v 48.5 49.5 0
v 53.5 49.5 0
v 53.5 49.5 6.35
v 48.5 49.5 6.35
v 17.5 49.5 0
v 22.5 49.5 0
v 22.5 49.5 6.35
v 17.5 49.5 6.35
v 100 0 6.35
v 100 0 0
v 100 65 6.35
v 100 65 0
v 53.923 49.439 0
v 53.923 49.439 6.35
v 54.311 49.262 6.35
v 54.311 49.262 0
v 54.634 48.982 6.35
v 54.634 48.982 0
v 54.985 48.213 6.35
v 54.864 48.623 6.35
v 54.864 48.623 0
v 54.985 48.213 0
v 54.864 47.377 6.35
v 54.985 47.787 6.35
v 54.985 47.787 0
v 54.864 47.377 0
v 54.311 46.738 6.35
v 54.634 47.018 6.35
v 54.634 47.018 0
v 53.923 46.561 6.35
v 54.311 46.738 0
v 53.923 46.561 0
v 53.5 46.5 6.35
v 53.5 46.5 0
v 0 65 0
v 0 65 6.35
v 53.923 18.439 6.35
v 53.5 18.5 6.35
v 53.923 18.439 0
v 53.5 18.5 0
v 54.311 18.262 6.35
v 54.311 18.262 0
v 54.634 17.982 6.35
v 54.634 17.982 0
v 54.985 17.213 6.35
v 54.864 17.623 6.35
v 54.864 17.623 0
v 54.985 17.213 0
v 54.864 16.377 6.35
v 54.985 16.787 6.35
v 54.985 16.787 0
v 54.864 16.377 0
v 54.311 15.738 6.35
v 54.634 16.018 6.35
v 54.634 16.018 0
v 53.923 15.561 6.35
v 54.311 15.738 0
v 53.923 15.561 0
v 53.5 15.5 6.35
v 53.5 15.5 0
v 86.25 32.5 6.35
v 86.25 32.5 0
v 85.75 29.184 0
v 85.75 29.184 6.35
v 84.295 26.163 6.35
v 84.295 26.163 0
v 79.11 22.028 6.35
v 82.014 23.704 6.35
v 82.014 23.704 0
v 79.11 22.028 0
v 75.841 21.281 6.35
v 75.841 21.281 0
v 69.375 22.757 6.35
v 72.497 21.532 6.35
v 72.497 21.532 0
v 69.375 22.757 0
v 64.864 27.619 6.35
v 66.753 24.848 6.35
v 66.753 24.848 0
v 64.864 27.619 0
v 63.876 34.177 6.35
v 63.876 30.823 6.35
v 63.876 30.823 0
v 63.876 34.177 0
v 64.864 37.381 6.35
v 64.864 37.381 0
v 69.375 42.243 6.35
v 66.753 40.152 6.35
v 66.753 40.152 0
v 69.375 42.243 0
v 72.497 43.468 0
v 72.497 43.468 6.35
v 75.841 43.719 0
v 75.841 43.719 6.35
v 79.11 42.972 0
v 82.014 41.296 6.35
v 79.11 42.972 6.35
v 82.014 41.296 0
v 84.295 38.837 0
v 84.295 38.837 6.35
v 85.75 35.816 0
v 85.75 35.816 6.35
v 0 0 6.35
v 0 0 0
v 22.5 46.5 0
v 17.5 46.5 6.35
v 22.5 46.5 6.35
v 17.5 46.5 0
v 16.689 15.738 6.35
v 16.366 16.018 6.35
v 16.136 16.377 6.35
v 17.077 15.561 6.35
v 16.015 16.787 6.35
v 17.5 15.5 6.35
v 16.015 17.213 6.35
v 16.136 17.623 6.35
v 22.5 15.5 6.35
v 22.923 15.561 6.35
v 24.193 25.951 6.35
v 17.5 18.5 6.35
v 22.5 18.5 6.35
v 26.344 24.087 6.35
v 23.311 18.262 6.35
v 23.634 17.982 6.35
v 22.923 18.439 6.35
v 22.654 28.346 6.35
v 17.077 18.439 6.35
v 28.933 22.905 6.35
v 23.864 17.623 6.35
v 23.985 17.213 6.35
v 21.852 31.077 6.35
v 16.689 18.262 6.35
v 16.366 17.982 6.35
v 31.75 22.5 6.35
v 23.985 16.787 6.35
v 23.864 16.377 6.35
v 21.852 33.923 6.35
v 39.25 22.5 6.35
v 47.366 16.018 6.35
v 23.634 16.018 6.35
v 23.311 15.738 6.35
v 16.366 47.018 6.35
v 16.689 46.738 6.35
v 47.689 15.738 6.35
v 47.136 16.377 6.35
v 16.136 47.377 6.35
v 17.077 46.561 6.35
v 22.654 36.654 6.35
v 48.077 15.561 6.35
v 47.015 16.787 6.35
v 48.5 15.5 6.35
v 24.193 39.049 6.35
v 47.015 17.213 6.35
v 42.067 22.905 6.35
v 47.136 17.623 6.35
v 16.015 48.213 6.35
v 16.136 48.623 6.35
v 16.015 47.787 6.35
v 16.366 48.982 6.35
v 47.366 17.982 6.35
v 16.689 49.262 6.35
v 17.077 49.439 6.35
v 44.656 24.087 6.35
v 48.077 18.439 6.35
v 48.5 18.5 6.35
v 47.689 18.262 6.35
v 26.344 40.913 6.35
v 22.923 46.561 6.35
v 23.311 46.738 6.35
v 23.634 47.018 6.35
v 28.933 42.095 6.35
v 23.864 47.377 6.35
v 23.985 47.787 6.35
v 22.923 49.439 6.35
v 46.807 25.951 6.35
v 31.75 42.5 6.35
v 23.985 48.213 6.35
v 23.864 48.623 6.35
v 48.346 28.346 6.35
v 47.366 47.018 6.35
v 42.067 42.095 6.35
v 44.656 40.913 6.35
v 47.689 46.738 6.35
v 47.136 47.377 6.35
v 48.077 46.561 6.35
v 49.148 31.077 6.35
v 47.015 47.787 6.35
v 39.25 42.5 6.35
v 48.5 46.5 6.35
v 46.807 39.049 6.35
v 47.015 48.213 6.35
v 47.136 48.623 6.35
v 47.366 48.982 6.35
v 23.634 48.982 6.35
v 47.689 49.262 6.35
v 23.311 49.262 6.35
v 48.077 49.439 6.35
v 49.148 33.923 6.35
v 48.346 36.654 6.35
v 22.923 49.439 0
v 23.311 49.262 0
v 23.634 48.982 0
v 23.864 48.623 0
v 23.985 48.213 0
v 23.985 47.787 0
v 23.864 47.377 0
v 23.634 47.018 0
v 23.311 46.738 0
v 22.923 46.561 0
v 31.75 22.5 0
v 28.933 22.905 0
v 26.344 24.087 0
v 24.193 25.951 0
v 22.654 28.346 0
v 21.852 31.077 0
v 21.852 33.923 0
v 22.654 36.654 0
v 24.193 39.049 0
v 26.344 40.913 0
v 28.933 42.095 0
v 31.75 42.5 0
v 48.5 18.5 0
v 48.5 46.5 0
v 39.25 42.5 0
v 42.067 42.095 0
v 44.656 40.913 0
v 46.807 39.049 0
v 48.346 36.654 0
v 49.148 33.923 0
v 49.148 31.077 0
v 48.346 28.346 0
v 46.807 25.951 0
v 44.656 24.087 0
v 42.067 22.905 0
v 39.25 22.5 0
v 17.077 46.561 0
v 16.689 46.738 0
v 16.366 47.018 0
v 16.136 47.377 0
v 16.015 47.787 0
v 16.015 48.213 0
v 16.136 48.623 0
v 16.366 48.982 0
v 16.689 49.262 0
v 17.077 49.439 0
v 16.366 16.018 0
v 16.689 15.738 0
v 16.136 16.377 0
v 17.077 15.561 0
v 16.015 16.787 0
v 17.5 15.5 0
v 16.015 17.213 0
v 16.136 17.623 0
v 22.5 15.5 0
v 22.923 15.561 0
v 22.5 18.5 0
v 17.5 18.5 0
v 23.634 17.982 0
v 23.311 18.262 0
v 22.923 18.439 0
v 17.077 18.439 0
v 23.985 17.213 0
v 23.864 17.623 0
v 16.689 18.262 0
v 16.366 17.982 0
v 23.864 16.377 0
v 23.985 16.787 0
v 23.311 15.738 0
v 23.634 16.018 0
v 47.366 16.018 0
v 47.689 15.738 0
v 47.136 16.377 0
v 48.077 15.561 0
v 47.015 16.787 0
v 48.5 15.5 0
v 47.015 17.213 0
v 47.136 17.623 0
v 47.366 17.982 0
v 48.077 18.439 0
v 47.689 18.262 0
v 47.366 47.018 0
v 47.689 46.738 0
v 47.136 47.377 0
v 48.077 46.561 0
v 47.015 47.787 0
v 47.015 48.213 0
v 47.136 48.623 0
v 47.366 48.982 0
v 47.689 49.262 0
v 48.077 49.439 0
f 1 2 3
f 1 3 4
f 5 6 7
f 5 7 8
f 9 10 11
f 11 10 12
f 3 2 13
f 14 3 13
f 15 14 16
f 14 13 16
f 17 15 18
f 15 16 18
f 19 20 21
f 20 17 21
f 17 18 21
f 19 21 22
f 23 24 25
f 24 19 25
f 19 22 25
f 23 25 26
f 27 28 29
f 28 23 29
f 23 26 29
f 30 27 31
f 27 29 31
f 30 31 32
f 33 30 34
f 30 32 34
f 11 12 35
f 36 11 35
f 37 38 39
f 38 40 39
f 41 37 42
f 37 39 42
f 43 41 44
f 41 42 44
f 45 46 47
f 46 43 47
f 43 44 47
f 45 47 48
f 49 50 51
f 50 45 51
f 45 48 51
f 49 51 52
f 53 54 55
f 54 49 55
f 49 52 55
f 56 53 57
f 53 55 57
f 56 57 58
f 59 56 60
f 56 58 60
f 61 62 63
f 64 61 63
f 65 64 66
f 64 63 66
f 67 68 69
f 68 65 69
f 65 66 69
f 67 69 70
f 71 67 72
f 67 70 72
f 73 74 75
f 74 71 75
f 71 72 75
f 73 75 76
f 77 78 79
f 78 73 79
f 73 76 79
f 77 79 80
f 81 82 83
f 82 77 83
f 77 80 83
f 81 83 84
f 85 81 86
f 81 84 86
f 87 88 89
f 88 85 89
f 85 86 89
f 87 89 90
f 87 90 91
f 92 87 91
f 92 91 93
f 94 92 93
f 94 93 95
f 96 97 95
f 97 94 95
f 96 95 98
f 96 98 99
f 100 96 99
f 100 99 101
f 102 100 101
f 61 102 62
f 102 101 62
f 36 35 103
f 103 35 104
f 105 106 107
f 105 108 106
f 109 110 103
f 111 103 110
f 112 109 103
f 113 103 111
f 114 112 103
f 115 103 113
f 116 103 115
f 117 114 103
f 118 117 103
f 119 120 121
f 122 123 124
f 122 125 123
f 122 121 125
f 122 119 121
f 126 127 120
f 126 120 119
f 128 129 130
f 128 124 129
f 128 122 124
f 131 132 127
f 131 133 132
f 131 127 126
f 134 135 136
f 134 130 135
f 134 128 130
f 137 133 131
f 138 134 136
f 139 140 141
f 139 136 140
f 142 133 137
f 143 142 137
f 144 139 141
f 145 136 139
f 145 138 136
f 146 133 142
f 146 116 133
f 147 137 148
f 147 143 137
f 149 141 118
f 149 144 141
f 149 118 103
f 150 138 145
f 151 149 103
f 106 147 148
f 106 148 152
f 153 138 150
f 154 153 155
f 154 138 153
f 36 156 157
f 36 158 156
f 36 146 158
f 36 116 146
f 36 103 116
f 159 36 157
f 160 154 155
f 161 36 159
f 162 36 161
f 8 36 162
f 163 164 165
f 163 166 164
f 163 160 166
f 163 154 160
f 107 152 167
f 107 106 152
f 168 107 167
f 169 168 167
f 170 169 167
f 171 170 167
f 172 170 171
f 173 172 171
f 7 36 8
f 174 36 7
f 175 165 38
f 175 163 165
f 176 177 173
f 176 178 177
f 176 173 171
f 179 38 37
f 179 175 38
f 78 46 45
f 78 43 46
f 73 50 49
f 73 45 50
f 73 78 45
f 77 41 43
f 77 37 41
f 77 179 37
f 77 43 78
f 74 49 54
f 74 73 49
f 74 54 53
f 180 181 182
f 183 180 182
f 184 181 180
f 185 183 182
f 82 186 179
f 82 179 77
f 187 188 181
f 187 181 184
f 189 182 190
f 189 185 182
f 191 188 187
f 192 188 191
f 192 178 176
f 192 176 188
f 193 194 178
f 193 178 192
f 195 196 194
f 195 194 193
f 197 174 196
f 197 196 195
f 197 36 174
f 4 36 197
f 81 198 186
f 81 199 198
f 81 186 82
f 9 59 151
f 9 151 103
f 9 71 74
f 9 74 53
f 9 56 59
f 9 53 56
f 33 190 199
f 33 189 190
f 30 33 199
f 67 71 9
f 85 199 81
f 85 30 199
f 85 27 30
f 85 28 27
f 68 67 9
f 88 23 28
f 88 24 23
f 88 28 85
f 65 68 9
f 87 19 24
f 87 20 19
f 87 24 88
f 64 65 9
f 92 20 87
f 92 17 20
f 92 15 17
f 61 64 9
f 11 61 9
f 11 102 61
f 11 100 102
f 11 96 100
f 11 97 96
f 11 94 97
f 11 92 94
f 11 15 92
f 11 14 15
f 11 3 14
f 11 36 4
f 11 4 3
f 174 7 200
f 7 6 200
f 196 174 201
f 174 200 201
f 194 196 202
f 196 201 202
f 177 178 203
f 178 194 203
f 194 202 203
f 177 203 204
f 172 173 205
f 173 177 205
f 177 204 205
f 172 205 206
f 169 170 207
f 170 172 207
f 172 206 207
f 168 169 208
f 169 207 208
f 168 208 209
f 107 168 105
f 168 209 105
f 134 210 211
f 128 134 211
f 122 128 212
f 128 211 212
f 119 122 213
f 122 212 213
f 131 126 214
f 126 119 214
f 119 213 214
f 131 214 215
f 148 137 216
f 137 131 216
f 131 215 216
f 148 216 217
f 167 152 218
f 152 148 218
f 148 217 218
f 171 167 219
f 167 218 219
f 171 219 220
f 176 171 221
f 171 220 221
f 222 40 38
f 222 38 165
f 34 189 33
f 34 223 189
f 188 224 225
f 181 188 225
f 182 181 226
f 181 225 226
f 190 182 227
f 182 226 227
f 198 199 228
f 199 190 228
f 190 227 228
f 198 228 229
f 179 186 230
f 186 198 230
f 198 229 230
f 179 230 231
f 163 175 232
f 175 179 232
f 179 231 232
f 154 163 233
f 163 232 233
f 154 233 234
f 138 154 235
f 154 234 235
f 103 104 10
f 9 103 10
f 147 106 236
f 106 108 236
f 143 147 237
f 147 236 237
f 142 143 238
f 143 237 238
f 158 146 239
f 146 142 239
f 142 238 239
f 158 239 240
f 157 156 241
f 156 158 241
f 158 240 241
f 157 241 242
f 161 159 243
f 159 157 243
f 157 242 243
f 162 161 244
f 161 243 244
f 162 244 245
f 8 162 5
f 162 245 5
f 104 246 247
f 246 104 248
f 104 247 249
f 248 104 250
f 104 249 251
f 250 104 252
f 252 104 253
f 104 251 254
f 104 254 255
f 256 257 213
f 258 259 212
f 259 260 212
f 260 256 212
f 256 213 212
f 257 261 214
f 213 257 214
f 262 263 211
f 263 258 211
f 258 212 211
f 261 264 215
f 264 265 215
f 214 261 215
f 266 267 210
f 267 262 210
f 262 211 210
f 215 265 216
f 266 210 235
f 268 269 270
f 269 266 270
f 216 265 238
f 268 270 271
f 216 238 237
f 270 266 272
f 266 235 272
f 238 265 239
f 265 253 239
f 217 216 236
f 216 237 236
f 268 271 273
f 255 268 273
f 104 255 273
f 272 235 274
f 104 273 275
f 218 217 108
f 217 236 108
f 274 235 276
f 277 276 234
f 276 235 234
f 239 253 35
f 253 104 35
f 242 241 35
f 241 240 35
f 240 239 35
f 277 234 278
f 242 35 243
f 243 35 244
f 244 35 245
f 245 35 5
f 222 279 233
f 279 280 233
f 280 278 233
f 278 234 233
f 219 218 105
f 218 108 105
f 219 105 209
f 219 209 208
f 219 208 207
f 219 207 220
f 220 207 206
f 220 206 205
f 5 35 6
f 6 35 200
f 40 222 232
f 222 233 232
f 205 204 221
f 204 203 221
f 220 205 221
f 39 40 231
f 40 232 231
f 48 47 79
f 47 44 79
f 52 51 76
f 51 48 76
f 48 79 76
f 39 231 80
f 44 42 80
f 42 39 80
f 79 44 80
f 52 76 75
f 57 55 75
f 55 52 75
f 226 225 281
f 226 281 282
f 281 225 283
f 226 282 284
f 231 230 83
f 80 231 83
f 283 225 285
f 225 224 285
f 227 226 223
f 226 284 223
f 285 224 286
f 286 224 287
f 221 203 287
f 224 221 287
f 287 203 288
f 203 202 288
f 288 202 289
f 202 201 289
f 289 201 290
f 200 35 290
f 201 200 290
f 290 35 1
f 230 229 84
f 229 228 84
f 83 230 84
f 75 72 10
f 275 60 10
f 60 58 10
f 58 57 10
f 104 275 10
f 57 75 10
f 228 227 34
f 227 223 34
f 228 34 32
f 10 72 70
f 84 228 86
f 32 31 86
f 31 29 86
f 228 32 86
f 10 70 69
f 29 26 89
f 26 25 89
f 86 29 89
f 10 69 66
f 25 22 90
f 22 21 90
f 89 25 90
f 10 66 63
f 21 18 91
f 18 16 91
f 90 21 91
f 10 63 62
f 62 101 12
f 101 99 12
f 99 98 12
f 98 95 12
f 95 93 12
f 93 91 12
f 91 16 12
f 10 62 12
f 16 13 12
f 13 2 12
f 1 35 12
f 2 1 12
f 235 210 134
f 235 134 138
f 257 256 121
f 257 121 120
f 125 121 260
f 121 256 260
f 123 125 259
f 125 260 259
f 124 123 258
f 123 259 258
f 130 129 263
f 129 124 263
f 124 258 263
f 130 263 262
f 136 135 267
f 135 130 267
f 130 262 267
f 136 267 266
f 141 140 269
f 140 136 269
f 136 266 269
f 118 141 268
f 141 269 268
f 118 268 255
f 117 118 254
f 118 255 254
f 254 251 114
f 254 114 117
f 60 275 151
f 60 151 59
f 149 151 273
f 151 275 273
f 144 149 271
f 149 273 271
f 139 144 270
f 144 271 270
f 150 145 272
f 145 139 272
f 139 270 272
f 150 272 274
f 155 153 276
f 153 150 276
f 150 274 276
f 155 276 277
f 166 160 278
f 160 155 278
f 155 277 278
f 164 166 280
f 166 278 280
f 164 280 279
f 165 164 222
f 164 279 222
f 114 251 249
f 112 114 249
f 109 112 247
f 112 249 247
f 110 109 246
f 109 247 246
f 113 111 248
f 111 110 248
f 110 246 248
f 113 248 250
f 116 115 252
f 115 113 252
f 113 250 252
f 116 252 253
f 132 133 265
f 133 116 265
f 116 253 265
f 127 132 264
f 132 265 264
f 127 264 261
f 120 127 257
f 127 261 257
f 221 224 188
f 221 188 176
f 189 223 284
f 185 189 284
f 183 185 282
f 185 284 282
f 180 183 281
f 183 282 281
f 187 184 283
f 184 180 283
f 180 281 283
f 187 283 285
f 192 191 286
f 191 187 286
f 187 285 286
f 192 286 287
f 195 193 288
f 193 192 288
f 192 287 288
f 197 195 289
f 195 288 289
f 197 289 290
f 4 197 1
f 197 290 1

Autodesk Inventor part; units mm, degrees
ref_plane "YZ Plane" through (0, 0, 0) normal (1, 0, 0) x (0, 1, 0)
ref_plane "XZ Plane" through (0, 0, 0) normal (0, 1, 0) x (-1, 0, 0)
ref_plane "XY Plane" through (0, 0, 0) normal (0, 0, 1) x (1, 0, 0)
sketch "Sketch1" plane through (0, 0, 0) normal (0, 0, 1) x (1, 0, 0)
  line L0 (0, 0) -> (100, 0)
  line L1 (100, 0) -> (100, 65)
  line L2 (100, 65) -> (0, 65)
  line L3 (0, 65) -> (0, 0)
  line L4 (17.5, 48) -> (22.5, 48) construction
  line L5 (17.5, 46.5) -> (22.5, 46.5)
  line L6 (22.5, 49.5) -> (17.5, 49.5)
  arc A0 (17.5, 49.5) -> (17.5, 46.5) centre (17.5, 48) ccw
  arc A1 (22.5, 46.5) -> (22.5, 49.5) centre (22.5, 48) ccw
  line L7 (53.5, 48) -> (48.5, 48) construction
  line L8 (53.5, 49.5) -> (48.5, 49.5)
  line L9 (48.5, 46.5) -> (53.5, 46.5)
  arc A2 (53.5, 46.5) -> (53.5, 49.5) centre (53.5, 48) ccw
  arc A3 (48.5, 49.5) -> (48.5, 46.5) centre (48.5, 48) ccw
  line L10 (17.5, 17) -> (22.5, 17) construction
  line L11 (17.5, 15.5) -> (22.5, 15.5)
  line L12 (22.5, 18.5) -> (17.5, 18.5)
  arc A4 (17.5, 18.5) -> (17.5, 15.5) centre (17.5, 17) ccw
  arc A5 (22.5, 15.5) -> (22.5, 18.5) centre (22.5, 17) ccw
  line L13 (48.5, 17) -> (53.5, 17) construction
  line L14 (48.5, 15.5) -> (53.5, 15.5)
  line L15 (53.5, 18.5) -> (48.5, 18.5)
  arc A6 (48.5, 18.5) -> (48.5, 15.5) centre (48.5, 17) ccw
  arc A7 (53.5, 15.5) -> (53.5, 18.5) centre (53.5, 17) ccw
  line L16 (31.75, 32.5) -> (39.25, 32.5) construction
  line L17 (31.75, 22.5) -> (39.25, 22.5)
  line L18 (39.25, 42.5) -> (31.75, 42.5)
  arc A8 (31.75, 42.5) -> (31.75, 22.5) centre (31.75, 32.5) ccw
  arc A9 (39.25, 22.5) -> (39.25, 42.5) centre (39.25, 32.5) ccw
  circle A10 centre (75, 32.5) radius 11.25
  point P0 (20, 48)
  point P1 (51, 48)
  point P2 (20, 17)
  point P3 (51, 17)
  point P4 (35.5, 32.5)
  point P5 (0, 32.5)
  dimension "d0" = 65
  dimension "d1" = 100
  dimension "d2" = 1.5
  dimension "d3" = 5
  dimension "d4" = 31
  dimension "d5" = 31
  dimension "d6" = 20
  dimension "d7" = 15.5
  dimension "d8" = 15.5
  dimension "d9" = 7.5
  dimension "d10" = 20
  dimension "d11" = 75
  dimension "d12" = 22.5
extrude "Extrusion1" add sketch "Sketch1" along normal blind 6.35
equation "\"d5\" = d4"
equation "\"d7\" = 0.5 * d4"
equation "\"d8\" = 0.5 * d5"
equation "\"d13\" = THICKB"
equation "\"THICKA\" = 3.175"
equation "\"THICKB\" = 6.35"
equation "\"THICKC\" = 12.7"
properties part number "WoodD_Extruder_Side_Motor"
